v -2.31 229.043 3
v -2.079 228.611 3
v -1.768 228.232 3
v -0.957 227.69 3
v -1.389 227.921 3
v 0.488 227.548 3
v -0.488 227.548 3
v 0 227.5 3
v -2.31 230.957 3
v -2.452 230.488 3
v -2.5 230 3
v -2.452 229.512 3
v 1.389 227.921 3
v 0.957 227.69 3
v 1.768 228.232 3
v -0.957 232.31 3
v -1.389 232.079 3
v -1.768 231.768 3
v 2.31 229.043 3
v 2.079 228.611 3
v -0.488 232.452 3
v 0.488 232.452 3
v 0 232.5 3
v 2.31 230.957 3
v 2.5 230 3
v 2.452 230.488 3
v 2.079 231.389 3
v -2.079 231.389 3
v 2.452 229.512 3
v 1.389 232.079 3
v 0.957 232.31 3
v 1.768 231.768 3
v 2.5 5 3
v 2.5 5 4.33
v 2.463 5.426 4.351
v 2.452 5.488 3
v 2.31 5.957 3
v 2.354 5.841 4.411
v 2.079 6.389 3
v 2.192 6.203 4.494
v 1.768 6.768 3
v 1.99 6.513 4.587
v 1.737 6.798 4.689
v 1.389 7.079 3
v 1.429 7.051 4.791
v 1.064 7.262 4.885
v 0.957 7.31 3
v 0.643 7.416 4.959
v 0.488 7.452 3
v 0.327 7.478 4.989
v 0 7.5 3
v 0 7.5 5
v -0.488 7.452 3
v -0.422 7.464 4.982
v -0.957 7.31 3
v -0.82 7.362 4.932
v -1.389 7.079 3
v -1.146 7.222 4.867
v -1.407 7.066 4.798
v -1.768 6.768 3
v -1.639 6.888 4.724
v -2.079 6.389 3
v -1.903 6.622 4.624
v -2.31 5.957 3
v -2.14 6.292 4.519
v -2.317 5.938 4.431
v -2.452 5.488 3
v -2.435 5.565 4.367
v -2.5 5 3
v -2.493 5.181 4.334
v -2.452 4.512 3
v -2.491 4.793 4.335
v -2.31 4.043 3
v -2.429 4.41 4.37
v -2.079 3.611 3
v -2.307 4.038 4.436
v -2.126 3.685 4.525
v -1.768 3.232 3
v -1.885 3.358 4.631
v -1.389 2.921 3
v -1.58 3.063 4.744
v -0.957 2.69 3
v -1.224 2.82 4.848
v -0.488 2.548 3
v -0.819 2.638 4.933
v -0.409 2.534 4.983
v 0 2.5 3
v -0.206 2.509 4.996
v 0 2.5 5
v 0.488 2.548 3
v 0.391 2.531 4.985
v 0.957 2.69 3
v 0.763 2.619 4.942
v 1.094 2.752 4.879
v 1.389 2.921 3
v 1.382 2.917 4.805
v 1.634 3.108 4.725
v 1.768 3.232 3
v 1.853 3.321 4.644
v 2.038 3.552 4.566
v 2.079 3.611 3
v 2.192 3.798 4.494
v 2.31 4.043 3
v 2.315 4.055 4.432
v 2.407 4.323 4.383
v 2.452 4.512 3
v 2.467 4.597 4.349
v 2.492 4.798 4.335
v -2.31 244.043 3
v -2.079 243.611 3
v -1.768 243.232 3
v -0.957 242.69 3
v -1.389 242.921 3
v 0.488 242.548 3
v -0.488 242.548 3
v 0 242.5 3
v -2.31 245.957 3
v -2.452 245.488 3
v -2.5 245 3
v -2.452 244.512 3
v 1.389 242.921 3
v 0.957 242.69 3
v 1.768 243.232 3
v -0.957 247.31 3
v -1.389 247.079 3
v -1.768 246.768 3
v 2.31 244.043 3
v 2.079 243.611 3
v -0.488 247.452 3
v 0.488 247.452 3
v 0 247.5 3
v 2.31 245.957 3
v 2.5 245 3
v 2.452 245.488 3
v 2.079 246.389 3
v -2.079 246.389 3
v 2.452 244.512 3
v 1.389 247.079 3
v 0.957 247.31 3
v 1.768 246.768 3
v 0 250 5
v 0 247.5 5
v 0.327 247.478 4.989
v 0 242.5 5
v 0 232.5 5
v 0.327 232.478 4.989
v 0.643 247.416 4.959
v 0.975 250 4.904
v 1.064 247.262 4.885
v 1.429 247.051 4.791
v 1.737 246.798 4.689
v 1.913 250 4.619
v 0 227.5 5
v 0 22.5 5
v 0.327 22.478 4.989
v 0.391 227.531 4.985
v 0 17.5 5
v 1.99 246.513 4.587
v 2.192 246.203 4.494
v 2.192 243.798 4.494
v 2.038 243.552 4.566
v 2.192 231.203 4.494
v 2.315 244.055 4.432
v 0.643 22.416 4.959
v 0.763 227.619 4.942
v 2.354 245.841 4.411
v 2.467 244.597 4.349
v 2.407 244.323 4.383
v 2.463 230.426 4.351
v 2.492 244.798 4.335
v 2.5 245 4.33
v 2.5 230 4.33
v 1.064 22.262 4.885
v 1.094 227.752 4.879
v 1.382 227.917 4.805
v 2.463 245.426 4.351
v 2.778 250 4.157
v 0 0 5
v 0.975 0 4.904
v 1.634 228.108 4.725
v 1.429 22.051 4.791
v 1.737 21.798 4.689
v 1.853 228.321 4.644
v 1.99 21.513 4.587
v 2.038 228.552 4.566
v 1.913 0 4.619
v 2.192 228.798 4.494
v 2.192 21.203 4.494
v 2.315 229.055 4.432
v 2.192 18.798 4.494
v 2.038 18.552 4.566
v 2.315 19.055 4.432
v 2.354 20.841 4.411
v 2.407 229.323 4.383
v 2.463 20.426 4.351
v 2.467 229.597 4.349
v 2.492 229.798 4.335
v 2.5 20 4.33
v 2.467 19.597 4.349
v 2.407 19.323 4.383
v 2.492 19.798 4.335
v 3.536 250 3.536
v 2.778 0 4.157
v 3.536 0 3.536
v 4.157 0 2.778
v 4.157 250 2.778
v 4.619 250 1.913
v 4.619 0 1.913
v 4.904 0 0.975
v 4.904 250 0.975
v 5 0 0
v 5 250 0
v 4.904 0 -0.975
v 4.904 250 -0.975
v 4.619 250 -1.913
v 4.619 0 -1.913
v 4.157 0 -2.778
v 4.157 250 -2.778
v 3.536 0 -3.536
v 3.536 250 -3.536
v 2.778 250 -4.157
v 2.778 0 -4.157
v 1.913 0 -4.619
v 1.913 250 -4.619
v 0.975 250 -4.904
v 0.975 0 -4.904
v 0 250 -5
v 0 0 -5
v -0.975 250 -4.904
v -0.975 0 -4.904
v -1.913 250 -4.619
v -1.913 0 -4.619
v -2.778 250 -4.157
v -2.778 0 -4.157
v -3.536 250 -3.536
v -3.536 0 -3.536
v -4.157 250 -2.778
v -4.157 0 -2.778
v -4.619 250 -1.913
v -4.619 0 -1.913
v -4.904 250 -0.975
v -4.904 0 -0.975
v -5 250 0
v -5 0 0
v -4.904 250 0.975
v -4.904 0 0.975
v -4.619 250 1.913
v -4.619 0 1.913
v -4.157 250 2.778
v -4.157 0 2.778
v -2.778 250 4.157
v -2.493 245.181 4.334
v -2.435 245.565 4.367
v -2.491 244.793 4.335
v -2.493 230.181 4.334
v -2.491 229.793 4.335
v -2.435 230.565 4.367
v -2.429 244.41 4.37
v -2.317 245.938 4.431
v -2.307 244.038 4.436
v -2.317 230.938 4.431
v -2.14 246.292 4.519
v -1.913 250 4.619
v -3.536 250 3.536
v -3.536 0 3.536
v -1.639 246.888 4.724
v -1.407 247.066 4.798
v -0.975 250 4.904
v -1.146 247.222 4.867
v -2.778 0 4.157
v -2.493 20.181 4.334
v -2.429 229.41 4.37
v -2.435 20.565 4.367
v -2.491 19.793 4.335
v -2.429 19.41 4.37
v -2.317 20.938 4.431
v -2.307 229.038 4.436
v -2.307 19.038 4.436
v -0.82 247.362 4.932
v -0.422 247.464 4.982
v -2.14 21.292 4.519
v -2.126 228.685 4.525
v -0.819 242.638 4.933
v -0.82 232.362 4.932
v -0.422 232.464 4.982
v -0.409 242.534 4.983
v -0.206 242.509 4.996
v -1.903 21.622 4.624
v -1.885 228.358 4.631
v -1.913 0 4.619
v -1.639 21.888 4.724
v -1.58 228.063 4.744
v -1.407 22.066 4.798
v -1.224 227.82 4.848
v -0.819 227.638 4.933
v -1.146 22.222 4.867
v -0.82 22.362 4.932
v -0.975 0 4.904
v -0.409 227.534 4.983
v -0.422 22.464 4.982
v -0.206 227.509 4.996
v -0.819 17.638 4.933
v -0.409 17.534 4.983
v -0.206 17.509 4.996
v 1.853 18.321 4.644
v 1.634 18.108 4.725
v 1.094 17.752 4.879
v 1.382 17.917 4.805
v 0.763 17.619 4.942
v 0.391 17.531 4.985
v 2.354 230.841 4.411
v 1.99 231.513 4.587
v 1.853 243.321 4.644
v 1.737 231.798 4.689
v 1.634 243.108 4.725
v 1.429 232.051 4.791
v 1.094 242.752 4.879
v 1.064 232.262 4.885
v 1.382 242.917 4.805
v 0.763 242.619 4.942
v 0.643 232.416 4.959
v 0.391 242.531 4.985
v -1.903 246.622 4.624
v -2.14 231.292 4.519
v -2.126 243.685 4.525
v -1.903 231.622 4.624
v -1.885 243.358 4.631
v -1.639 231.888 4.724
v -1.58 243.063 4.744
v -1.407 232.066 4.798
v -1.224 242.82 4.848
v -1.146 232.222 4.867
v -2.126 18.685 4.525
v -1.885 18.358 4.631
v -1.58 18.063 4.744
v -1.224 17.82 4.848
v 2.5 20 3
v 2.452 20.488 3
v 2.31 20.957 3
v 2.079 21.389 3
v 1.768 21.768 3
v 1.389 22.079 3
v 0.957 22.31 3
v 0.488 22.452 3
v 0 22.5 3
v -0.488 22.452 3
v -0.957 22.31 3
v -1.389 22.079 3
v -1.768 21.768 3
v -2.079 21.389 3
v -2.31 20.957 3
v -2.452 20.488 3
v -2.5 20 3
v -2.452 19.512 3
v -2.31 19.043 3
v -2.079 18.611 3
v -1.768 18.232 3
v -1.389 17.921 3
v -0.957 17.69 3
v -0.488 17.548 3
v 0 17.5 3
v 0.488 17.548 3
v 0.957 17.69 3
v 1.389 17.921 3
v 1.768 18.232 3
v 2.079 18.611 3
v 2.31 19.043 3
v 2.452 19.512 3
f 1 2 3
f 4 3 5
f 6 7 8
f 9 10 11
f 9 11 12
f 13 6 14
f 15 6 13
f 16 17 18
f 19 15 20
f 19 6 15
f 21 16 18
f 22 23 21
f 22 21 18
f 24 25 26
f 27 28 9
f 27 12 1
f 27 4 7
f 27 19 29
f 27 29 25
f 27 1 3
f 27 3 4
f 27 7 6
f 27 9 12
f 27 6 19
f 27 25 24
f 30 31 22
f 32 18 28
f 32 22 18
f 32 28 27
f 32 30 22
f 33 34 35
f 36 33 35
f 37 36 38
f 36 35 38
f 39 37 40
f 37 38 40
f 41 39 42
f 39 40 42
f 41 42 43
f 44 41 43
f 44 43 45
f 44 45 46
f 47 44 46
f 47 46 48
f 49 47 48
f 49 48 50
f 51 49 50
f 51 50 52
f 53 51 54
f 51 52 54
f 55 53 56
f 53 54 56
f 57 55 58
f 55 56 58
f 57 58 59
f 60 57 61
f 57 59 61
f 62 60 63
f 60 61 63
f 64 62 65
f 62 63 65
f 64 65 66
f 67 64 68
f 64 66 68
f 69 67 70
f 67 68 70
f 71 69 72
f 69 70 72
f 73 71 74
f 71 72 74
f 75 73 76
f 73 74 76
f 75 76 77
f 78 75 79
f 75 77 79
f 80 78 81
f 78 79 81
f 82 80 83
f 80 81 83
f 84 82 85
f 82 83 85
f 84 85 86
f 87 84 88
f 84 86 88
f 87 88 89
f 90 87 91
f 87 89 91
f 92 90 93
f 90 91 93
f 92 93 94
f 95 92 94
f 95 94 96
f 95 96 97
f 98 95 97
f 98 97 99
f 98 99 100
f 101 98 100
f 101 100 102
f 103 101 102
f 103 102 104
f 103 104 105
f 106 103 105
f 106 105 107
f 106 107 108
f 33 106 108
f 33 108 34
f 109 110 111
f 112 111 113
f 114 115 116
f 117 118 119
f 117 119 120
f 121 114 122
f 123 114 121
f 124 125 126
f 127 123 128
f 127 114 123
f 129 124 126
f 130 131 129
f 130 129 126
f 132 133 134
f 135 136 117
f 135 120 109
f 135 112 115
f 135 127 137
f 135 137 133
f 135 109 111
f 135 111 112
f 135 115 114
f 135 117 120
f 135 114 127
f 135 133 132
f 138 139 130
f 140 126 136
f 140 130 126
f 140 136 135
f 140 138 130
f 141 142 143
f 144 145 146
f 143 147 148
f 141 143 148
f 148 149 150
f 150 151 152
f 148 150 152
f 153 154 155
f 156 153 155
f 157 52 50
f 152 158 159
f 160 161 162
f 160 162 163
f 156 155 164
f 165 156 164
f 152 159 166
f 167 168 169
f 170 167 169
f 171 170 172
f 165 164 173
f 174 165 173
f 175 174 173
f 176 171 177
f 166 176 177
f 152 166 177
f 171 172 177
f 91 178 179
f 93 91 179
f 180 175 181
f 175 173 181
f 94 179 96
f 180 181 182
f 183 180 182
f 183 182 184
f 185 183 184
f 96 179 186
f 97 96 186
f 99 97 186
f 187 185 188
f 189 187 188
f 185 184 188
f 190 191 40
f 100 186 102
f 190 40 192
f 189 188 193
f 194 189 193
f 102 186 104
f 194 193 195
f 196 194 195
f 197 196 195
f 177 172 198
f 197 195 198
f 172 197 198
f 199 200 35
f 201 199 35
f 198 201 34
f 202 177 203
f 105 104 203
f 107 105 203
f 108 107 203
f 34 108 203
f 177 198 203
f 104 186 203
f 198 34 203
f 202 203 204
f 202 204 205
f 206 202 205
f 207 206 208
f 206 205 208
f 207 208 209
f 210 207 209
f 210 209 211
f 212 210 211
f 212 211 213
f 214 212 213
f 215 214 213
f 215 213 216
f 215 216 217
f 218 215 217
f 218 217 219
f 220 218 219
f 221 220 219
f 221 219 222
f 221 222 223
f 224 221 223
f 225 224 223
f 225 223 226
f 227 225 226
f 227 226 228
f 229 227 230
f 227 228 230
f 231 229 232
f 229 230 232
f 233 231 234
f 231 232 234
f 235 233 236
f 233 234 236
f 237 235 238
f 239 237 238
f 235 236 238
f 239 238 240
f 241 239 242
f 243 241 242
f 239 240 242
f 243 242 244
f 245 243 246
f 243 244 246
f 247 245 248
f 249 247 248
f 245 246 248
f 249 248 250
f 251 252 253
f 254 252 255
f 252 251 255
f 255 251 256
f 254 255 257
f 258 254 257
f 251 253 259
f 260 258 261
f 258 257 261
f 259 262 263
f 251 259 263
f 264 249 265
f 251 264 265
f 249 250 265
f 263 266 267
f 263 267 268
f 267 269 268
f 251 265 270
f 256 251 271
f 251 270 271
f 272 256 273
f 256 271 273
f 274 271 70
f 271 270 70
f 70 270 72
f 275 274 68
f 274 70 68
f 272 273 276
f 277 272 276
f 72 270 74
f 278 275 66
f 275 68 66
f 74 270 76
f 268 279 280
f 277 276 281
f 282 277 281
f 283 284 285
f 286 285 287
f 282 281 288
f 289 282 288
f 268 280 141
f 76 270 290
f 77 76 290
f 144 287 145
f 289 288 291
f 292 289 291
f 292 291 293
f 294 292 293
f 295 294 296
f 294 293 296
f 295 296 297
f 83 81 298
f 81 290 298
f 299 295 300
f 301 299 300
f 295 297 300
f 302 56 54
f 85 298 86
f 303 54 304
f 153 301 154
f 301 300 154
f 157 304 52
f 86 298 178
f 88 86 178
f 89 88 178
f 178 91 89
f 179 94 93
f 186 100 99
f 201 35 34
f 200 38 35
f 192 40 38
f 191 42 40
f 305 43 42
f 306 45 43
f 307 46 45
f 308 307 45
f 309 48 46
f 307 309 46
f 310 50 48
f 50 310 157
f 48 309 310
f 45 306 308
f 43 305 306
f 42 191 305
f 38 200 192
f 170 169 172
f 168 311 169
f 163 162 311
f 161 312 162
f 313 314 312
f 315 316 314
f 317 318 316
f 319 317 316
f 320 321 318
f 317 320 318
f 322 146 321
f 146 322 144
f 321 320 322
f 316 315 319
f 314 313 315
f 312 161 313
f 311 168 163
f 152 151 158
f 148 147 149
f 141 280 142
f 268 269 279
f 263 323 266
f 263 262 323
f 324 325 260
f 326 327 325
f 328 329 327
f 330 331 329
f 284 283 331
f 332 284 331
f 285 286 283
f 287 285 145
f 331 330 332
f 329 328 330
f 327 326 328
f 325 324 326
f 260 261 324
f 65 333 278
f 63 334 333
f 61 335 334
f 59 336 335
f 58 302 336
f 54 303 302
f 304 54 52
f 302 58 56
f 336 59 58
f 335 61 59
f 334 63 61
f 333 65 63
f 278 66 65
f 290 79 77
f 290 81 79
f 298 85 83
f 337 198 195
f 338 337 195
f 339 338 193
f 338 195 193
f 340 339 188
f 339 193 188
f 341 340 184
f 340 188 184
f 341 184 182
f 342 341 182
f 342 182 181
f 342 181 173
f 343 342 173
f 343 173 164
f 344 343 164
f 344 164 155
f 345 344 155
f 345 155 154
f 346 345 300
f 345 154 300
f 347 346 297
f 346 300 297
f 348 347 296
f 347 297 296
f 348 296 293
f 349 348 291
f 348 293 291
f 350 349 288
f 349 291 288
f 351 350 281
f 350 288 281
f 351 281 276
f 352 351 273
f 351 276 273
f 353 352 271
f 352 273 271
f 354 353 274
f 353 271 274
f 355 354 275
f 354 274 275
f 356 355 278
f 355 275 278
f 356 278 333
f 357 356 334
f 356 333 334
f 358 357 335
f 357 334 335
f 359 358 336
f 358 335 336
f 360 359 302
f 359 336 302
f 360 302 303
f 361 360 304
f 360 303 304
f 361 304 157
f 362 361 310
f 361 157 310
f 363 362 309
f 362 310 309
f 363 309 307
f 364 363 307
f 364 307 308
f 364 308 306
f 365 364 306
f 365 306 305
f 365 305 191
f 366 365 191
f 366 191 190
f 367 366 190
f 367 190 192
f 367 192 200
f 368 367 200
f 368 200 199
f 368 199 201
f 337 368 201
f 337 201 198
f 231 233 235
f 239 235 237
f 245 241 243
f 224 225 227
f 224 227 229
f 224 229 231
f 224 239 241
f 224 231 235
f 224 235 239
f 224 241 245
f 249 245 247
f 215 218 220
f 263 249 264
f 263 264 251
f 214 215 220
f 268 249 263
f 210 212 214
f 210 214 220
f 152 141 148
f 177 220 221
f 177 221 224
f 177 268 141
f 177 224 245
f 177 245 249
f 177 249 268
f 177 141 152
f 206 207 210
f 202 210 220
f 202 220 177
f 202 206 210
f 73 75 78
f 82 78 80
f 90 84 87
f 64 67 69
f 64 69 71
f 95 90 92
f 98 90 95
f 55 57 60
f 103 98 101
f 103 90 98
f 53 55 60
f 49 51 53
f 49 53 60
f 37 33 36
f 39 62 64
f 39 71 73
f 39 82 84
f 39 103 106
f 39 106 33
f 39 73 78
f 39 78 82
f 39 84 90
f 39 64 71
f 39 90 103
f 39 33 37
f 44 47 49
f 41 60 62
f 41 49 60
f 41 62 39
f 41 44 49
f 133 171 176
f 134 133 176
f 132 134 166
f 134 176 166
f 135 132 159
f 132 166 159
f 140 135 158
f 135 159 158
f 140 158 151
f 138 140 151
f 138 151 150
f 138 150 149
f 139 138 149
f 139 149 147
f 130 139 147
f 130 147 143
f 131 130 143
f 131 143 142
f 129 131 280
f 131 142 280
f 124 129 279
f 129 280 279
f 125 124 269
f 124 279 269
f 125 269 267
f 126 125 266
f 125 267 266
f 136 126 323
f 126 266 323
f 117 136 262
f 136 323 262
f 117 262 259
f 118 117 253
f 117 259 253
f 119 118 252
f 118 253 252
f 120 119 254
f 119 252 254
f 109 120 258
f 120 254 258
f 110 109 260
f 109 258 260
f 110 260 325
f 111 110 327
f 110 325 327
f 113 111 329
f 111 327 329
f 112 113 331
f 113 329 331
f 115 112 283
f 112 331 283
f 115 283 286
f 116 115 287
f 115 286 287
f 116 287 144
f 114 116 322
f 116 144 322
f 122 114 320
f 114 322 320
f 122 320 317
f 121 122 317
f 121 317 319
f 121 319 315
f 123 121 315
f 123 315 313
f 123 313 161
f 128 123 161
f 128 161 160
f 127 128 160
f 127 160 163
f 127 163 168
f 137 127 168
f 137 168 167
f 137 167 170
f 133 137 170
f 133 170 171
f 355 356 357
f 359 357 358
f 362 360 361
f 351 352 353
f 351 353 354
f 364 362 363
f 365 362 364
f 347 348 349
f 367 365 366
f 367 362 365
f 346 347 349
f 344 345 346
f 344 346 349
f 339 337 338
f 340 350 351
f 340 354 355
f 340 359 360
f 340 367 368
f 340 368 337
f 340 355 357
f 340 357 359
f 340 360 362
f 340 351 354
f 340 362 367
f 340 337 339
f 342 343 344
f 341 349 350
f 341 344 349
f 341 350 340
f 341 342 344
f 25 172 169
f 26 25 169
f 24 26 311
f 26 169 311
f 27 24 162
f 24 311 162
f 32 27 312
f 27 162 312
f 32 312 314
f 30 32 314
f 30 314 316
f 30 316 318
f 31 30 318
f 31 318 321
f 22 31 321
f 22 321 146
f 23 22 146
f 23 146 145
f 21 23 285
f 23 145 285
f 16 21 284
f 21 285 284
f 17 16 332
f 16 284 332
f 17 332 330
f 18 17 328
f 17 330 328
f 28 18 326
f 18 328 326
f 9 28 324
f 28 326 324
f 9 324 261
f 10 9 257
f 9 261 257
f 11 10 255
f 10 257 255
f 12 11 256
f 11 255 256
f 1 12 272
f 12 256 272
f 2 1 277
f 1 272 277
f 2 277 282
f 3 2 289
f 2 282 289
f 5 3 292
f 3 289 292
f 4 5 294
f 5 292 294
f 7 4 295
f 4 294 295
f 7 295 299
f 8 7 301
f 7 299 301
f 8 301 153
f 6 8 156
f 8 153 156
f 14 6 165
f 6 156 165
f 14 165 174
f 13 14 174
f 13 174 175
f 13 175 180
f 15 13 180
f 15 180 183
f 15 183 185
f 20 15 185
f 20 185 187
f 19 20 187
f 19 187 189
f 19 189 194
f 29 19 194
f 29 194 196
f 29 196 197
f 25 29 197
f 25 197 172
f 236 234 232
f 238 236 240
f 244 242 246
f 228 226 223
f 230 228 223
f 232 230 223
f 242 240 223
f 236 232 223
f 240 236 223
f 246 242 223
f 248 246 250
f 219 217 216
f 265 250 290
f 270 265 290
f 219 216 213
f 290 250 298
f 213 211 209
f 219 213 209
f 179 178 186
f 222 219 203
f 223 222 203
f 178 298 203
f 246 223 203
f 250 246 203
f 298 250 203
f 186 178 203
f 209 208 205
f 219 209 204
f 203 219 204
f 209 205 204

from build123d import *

# Parameters (mm, degrees)
SKETCH1_R           = 5
BOSS_EXTRUDE1_DEPTH = 250
CUT_EXTRUDE1_START  = 5
SKETCH5_R           = 2.5
CUT_EXTRUDE1_DEPTH  = 2


with BuildPart() as part:
    # Sketch1 → Boss-Extrude1 (new body)
    with BuildSketch(Plane(origin=(0, 0, 0), x_dir=(1, 0, 0), z_dir=(0, 1, 0))):
        with Locations(Location((0, 0, 0), (0, 0, 270))):
            Circle(SKETCH1_R)
    extrude(amount=BOSS_EXTRUDE1_DEPTH)

    # Sketch5 → Cut-Extrude1 (cut)
    with BuildSketch(Plane.XY.offset(CUT_EXTRUDE1_START)):
        with Locations((0, 5)):
            Circle(SKETCH5_R)
        with Locations((0, 20)):
            Circle(SKETCH5_R)
        with Locations((0, 245)):
            Circle(SKETCH5_R)
        with Locations((0, 230)):
            Circle(SKETCH5_R)
    extrude(amount=-CUT_EXTRUDE1_DEPTH, mode=Mode.SUBTRACT)


solid = part.part
